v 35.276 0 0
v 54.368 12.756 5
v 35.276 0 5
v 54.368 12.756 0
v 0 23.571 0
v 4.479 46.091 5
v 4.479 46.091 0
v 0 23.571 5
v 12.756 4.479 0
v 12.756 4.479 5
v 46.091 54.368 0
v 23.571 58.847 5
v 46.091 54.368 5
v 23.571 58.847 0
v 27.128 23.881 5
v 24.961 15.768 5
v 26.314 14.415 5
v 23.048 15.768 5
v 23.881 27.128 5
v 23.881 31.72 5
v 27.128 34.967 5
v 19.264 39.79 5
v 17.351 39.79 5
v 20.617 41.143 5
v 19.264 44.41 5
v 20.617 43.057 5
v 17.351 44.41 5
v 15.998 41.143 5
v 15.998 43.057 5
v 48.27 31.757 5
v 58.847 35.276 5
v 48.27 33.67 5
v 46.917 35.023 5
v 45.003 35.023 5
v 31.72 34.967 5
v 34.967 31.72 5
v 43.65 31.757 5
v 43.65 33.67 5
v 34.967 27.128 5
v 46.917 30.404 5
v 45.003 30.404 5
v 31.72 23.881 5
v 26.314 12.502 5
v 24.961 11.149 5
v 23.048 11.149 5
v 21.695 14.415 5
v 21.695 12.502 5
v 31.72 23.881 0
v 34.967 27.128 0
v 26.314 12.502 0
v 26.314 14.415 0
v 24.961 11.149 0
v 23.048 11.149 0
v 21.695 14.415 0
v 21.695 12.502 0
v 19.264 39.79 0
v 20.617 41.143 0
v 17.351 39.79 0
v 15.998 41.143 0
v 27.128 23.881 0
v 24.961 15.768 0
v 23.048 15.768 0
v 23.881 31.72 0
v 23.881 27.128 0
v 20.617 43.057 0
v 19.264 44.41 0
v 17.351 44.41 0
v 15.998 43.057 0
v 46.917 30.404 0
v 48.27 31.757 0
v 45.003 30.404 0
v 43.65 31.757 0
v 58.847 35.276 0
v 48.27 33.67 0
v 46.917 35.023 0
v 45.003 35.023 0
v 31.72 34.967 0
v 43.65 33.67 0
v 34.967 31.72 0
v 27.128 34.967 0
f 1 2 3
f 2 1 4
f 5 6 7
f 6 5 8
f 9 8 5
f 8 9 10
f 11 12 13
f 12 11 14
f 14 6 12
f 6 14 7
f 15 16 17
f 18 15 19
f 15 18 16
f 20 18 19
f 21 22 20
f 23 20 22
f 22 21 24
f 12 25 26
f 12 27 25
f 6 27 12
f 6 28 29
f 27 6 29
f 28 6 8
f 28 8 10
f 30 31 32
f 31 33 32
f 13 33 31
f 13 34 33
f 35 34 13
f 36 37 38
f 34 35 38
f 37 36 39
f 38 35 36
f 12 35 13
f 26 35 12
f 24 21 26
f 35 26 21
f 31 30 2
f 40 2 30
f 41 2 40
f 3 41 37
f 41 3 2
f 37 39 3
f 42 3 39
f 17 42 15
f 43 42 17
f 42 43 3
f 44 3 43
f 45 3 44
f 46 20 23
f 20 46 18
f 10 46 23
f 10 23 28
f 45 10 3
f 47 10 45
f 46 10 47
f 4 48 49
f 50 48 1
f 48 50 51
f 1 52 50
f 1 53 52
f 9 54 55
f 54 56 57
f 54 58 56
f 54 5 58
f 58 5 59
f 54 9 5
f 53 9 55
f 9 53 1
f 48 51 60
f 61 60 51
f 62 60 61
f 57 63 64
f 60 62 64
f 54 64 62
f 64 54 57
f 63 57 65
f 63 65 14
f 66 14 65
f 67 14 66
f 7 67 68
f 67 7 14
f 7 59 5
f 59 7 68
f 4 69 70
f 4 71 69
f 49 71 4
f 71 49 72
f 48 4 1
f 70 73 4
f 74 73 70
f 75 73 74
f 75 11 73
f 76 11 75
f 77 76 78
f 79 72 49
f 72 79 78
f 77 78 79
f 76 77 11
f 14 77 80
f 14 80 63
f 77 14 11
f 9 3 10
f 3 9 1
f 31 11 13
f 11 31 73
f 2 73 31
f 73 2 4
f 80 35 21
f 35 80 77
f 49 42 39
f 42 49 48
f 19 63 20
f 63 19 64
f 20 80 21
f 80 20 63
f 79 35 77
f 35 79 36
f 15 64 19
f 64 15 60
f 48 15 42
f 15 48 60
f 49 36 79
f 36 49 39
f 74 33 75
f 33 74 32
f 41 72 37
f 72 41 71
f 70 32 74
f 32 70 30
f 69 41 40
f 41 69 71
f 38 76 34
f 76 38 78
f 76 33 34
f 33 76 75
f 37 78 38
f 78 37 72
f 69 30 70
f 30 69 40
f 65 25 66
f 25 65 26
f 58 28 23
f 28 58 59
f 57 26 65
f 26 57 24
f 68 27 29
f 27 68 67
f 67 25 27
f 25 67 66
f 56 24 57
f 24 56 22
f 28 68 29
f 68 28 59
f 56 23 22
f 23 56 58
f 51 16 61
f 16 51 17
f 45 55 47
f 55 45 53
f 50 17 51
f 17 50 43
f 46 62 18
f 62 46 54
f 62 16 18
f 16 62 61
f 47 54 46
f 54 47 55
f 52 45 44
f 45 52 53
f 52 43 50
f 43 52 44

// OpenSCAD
$fn = 32;

// ----------------------------------------------------------------------
// Polygon plate: 8-gon R30, 3 bolt windows
// ----------------------------------------------------------------------

// --- parameters (mm) ---
sides = 8;                // number of polygon sides
plate_r = 30;             // circumscribed radius of the polygon
bore_r = 6;               // centre bore radius
bolts = 3;                // number of bolt windows
ring_r = 16.86;           // bolt-circle radius
bolt_r = 2.5;             // bolt window radius
plate_t = 5;              // plate thickness, Z (extrusion height)
fit_tol = 0.05;           // declared fit tolerance (prompt contract)
free_tol = 0.3;           // declared free tolerance (prompt contract)

plate_d = 2 * plate_r;  // circumscribed diameter
bore_d = 2 * bore_r;  // centre bore diameter
bolt_d = 2 * bolt_r;  // bolt window diameter
ring_d = 2 * ring_r;  // bolt-circle diameter

profile = [[58.847, 35.276], [46.091, 54.368], [23.571, 58.847], [4.479, 46.091], [0, 23.571], [12.756, 4.479], [35.276, 0], [54.368, 12.756]];  // primary outline, 8 points, counter clockwise
void_1 = [[34.967, 31.72], [31.72, 34.967], [27.128, 34.967], [23.881, 31.72], [23.881, 27.128], [27.128, 23.881], [31.72, 23.881], [34.967, 27.128]];  // centre bore, 8 points
void_2 = [[48.27, 33.67], [46.917, 35.023], [45.003, 35.023], [43.65, 33.67], [43.65, 31.757], [45.003, 30.404], [46.917, 30.404], [48.27, 31.757]];  // bolt window 1, 8 points
void_3 = [[20.617, 43.057], [19.264, 44.41], [17.351, 44.41], [15.998, 43.057], [15.998, 41.143], [17.351, 39.79], [19.264, 39.79], [20.617, 41.143]];  // bolt window 2, 8 points
void_4 = [[26.314, 14.415], [24.961, 15.768], [23.048, 15.768], [21.695, 14.415], [21.695, 12.502], [23.048, 11.149], [24.961, 11.149], [26.314, 12.502]];  // bolt window 3, 8 points

// --- the one profile operation ---
difference() {
  linear_extrude(height = plate_t) polygon(points = profile);
  translate([0, 0, -1])
    linear_extrude(height = plate_t + 2) polygon(points = void_1);
  translate([0, 0, -1])
    linear_extrude(height = plate_t + 2) polygon(points = void_2);
  translate([0, 0, -1])
    linear_extrude(height = plate_t + 2) polygon(points = void_3);
  translate([0, 0, -1])
    linear_extrude(height = plate_t + 2) polygon(points = void_4);
}
